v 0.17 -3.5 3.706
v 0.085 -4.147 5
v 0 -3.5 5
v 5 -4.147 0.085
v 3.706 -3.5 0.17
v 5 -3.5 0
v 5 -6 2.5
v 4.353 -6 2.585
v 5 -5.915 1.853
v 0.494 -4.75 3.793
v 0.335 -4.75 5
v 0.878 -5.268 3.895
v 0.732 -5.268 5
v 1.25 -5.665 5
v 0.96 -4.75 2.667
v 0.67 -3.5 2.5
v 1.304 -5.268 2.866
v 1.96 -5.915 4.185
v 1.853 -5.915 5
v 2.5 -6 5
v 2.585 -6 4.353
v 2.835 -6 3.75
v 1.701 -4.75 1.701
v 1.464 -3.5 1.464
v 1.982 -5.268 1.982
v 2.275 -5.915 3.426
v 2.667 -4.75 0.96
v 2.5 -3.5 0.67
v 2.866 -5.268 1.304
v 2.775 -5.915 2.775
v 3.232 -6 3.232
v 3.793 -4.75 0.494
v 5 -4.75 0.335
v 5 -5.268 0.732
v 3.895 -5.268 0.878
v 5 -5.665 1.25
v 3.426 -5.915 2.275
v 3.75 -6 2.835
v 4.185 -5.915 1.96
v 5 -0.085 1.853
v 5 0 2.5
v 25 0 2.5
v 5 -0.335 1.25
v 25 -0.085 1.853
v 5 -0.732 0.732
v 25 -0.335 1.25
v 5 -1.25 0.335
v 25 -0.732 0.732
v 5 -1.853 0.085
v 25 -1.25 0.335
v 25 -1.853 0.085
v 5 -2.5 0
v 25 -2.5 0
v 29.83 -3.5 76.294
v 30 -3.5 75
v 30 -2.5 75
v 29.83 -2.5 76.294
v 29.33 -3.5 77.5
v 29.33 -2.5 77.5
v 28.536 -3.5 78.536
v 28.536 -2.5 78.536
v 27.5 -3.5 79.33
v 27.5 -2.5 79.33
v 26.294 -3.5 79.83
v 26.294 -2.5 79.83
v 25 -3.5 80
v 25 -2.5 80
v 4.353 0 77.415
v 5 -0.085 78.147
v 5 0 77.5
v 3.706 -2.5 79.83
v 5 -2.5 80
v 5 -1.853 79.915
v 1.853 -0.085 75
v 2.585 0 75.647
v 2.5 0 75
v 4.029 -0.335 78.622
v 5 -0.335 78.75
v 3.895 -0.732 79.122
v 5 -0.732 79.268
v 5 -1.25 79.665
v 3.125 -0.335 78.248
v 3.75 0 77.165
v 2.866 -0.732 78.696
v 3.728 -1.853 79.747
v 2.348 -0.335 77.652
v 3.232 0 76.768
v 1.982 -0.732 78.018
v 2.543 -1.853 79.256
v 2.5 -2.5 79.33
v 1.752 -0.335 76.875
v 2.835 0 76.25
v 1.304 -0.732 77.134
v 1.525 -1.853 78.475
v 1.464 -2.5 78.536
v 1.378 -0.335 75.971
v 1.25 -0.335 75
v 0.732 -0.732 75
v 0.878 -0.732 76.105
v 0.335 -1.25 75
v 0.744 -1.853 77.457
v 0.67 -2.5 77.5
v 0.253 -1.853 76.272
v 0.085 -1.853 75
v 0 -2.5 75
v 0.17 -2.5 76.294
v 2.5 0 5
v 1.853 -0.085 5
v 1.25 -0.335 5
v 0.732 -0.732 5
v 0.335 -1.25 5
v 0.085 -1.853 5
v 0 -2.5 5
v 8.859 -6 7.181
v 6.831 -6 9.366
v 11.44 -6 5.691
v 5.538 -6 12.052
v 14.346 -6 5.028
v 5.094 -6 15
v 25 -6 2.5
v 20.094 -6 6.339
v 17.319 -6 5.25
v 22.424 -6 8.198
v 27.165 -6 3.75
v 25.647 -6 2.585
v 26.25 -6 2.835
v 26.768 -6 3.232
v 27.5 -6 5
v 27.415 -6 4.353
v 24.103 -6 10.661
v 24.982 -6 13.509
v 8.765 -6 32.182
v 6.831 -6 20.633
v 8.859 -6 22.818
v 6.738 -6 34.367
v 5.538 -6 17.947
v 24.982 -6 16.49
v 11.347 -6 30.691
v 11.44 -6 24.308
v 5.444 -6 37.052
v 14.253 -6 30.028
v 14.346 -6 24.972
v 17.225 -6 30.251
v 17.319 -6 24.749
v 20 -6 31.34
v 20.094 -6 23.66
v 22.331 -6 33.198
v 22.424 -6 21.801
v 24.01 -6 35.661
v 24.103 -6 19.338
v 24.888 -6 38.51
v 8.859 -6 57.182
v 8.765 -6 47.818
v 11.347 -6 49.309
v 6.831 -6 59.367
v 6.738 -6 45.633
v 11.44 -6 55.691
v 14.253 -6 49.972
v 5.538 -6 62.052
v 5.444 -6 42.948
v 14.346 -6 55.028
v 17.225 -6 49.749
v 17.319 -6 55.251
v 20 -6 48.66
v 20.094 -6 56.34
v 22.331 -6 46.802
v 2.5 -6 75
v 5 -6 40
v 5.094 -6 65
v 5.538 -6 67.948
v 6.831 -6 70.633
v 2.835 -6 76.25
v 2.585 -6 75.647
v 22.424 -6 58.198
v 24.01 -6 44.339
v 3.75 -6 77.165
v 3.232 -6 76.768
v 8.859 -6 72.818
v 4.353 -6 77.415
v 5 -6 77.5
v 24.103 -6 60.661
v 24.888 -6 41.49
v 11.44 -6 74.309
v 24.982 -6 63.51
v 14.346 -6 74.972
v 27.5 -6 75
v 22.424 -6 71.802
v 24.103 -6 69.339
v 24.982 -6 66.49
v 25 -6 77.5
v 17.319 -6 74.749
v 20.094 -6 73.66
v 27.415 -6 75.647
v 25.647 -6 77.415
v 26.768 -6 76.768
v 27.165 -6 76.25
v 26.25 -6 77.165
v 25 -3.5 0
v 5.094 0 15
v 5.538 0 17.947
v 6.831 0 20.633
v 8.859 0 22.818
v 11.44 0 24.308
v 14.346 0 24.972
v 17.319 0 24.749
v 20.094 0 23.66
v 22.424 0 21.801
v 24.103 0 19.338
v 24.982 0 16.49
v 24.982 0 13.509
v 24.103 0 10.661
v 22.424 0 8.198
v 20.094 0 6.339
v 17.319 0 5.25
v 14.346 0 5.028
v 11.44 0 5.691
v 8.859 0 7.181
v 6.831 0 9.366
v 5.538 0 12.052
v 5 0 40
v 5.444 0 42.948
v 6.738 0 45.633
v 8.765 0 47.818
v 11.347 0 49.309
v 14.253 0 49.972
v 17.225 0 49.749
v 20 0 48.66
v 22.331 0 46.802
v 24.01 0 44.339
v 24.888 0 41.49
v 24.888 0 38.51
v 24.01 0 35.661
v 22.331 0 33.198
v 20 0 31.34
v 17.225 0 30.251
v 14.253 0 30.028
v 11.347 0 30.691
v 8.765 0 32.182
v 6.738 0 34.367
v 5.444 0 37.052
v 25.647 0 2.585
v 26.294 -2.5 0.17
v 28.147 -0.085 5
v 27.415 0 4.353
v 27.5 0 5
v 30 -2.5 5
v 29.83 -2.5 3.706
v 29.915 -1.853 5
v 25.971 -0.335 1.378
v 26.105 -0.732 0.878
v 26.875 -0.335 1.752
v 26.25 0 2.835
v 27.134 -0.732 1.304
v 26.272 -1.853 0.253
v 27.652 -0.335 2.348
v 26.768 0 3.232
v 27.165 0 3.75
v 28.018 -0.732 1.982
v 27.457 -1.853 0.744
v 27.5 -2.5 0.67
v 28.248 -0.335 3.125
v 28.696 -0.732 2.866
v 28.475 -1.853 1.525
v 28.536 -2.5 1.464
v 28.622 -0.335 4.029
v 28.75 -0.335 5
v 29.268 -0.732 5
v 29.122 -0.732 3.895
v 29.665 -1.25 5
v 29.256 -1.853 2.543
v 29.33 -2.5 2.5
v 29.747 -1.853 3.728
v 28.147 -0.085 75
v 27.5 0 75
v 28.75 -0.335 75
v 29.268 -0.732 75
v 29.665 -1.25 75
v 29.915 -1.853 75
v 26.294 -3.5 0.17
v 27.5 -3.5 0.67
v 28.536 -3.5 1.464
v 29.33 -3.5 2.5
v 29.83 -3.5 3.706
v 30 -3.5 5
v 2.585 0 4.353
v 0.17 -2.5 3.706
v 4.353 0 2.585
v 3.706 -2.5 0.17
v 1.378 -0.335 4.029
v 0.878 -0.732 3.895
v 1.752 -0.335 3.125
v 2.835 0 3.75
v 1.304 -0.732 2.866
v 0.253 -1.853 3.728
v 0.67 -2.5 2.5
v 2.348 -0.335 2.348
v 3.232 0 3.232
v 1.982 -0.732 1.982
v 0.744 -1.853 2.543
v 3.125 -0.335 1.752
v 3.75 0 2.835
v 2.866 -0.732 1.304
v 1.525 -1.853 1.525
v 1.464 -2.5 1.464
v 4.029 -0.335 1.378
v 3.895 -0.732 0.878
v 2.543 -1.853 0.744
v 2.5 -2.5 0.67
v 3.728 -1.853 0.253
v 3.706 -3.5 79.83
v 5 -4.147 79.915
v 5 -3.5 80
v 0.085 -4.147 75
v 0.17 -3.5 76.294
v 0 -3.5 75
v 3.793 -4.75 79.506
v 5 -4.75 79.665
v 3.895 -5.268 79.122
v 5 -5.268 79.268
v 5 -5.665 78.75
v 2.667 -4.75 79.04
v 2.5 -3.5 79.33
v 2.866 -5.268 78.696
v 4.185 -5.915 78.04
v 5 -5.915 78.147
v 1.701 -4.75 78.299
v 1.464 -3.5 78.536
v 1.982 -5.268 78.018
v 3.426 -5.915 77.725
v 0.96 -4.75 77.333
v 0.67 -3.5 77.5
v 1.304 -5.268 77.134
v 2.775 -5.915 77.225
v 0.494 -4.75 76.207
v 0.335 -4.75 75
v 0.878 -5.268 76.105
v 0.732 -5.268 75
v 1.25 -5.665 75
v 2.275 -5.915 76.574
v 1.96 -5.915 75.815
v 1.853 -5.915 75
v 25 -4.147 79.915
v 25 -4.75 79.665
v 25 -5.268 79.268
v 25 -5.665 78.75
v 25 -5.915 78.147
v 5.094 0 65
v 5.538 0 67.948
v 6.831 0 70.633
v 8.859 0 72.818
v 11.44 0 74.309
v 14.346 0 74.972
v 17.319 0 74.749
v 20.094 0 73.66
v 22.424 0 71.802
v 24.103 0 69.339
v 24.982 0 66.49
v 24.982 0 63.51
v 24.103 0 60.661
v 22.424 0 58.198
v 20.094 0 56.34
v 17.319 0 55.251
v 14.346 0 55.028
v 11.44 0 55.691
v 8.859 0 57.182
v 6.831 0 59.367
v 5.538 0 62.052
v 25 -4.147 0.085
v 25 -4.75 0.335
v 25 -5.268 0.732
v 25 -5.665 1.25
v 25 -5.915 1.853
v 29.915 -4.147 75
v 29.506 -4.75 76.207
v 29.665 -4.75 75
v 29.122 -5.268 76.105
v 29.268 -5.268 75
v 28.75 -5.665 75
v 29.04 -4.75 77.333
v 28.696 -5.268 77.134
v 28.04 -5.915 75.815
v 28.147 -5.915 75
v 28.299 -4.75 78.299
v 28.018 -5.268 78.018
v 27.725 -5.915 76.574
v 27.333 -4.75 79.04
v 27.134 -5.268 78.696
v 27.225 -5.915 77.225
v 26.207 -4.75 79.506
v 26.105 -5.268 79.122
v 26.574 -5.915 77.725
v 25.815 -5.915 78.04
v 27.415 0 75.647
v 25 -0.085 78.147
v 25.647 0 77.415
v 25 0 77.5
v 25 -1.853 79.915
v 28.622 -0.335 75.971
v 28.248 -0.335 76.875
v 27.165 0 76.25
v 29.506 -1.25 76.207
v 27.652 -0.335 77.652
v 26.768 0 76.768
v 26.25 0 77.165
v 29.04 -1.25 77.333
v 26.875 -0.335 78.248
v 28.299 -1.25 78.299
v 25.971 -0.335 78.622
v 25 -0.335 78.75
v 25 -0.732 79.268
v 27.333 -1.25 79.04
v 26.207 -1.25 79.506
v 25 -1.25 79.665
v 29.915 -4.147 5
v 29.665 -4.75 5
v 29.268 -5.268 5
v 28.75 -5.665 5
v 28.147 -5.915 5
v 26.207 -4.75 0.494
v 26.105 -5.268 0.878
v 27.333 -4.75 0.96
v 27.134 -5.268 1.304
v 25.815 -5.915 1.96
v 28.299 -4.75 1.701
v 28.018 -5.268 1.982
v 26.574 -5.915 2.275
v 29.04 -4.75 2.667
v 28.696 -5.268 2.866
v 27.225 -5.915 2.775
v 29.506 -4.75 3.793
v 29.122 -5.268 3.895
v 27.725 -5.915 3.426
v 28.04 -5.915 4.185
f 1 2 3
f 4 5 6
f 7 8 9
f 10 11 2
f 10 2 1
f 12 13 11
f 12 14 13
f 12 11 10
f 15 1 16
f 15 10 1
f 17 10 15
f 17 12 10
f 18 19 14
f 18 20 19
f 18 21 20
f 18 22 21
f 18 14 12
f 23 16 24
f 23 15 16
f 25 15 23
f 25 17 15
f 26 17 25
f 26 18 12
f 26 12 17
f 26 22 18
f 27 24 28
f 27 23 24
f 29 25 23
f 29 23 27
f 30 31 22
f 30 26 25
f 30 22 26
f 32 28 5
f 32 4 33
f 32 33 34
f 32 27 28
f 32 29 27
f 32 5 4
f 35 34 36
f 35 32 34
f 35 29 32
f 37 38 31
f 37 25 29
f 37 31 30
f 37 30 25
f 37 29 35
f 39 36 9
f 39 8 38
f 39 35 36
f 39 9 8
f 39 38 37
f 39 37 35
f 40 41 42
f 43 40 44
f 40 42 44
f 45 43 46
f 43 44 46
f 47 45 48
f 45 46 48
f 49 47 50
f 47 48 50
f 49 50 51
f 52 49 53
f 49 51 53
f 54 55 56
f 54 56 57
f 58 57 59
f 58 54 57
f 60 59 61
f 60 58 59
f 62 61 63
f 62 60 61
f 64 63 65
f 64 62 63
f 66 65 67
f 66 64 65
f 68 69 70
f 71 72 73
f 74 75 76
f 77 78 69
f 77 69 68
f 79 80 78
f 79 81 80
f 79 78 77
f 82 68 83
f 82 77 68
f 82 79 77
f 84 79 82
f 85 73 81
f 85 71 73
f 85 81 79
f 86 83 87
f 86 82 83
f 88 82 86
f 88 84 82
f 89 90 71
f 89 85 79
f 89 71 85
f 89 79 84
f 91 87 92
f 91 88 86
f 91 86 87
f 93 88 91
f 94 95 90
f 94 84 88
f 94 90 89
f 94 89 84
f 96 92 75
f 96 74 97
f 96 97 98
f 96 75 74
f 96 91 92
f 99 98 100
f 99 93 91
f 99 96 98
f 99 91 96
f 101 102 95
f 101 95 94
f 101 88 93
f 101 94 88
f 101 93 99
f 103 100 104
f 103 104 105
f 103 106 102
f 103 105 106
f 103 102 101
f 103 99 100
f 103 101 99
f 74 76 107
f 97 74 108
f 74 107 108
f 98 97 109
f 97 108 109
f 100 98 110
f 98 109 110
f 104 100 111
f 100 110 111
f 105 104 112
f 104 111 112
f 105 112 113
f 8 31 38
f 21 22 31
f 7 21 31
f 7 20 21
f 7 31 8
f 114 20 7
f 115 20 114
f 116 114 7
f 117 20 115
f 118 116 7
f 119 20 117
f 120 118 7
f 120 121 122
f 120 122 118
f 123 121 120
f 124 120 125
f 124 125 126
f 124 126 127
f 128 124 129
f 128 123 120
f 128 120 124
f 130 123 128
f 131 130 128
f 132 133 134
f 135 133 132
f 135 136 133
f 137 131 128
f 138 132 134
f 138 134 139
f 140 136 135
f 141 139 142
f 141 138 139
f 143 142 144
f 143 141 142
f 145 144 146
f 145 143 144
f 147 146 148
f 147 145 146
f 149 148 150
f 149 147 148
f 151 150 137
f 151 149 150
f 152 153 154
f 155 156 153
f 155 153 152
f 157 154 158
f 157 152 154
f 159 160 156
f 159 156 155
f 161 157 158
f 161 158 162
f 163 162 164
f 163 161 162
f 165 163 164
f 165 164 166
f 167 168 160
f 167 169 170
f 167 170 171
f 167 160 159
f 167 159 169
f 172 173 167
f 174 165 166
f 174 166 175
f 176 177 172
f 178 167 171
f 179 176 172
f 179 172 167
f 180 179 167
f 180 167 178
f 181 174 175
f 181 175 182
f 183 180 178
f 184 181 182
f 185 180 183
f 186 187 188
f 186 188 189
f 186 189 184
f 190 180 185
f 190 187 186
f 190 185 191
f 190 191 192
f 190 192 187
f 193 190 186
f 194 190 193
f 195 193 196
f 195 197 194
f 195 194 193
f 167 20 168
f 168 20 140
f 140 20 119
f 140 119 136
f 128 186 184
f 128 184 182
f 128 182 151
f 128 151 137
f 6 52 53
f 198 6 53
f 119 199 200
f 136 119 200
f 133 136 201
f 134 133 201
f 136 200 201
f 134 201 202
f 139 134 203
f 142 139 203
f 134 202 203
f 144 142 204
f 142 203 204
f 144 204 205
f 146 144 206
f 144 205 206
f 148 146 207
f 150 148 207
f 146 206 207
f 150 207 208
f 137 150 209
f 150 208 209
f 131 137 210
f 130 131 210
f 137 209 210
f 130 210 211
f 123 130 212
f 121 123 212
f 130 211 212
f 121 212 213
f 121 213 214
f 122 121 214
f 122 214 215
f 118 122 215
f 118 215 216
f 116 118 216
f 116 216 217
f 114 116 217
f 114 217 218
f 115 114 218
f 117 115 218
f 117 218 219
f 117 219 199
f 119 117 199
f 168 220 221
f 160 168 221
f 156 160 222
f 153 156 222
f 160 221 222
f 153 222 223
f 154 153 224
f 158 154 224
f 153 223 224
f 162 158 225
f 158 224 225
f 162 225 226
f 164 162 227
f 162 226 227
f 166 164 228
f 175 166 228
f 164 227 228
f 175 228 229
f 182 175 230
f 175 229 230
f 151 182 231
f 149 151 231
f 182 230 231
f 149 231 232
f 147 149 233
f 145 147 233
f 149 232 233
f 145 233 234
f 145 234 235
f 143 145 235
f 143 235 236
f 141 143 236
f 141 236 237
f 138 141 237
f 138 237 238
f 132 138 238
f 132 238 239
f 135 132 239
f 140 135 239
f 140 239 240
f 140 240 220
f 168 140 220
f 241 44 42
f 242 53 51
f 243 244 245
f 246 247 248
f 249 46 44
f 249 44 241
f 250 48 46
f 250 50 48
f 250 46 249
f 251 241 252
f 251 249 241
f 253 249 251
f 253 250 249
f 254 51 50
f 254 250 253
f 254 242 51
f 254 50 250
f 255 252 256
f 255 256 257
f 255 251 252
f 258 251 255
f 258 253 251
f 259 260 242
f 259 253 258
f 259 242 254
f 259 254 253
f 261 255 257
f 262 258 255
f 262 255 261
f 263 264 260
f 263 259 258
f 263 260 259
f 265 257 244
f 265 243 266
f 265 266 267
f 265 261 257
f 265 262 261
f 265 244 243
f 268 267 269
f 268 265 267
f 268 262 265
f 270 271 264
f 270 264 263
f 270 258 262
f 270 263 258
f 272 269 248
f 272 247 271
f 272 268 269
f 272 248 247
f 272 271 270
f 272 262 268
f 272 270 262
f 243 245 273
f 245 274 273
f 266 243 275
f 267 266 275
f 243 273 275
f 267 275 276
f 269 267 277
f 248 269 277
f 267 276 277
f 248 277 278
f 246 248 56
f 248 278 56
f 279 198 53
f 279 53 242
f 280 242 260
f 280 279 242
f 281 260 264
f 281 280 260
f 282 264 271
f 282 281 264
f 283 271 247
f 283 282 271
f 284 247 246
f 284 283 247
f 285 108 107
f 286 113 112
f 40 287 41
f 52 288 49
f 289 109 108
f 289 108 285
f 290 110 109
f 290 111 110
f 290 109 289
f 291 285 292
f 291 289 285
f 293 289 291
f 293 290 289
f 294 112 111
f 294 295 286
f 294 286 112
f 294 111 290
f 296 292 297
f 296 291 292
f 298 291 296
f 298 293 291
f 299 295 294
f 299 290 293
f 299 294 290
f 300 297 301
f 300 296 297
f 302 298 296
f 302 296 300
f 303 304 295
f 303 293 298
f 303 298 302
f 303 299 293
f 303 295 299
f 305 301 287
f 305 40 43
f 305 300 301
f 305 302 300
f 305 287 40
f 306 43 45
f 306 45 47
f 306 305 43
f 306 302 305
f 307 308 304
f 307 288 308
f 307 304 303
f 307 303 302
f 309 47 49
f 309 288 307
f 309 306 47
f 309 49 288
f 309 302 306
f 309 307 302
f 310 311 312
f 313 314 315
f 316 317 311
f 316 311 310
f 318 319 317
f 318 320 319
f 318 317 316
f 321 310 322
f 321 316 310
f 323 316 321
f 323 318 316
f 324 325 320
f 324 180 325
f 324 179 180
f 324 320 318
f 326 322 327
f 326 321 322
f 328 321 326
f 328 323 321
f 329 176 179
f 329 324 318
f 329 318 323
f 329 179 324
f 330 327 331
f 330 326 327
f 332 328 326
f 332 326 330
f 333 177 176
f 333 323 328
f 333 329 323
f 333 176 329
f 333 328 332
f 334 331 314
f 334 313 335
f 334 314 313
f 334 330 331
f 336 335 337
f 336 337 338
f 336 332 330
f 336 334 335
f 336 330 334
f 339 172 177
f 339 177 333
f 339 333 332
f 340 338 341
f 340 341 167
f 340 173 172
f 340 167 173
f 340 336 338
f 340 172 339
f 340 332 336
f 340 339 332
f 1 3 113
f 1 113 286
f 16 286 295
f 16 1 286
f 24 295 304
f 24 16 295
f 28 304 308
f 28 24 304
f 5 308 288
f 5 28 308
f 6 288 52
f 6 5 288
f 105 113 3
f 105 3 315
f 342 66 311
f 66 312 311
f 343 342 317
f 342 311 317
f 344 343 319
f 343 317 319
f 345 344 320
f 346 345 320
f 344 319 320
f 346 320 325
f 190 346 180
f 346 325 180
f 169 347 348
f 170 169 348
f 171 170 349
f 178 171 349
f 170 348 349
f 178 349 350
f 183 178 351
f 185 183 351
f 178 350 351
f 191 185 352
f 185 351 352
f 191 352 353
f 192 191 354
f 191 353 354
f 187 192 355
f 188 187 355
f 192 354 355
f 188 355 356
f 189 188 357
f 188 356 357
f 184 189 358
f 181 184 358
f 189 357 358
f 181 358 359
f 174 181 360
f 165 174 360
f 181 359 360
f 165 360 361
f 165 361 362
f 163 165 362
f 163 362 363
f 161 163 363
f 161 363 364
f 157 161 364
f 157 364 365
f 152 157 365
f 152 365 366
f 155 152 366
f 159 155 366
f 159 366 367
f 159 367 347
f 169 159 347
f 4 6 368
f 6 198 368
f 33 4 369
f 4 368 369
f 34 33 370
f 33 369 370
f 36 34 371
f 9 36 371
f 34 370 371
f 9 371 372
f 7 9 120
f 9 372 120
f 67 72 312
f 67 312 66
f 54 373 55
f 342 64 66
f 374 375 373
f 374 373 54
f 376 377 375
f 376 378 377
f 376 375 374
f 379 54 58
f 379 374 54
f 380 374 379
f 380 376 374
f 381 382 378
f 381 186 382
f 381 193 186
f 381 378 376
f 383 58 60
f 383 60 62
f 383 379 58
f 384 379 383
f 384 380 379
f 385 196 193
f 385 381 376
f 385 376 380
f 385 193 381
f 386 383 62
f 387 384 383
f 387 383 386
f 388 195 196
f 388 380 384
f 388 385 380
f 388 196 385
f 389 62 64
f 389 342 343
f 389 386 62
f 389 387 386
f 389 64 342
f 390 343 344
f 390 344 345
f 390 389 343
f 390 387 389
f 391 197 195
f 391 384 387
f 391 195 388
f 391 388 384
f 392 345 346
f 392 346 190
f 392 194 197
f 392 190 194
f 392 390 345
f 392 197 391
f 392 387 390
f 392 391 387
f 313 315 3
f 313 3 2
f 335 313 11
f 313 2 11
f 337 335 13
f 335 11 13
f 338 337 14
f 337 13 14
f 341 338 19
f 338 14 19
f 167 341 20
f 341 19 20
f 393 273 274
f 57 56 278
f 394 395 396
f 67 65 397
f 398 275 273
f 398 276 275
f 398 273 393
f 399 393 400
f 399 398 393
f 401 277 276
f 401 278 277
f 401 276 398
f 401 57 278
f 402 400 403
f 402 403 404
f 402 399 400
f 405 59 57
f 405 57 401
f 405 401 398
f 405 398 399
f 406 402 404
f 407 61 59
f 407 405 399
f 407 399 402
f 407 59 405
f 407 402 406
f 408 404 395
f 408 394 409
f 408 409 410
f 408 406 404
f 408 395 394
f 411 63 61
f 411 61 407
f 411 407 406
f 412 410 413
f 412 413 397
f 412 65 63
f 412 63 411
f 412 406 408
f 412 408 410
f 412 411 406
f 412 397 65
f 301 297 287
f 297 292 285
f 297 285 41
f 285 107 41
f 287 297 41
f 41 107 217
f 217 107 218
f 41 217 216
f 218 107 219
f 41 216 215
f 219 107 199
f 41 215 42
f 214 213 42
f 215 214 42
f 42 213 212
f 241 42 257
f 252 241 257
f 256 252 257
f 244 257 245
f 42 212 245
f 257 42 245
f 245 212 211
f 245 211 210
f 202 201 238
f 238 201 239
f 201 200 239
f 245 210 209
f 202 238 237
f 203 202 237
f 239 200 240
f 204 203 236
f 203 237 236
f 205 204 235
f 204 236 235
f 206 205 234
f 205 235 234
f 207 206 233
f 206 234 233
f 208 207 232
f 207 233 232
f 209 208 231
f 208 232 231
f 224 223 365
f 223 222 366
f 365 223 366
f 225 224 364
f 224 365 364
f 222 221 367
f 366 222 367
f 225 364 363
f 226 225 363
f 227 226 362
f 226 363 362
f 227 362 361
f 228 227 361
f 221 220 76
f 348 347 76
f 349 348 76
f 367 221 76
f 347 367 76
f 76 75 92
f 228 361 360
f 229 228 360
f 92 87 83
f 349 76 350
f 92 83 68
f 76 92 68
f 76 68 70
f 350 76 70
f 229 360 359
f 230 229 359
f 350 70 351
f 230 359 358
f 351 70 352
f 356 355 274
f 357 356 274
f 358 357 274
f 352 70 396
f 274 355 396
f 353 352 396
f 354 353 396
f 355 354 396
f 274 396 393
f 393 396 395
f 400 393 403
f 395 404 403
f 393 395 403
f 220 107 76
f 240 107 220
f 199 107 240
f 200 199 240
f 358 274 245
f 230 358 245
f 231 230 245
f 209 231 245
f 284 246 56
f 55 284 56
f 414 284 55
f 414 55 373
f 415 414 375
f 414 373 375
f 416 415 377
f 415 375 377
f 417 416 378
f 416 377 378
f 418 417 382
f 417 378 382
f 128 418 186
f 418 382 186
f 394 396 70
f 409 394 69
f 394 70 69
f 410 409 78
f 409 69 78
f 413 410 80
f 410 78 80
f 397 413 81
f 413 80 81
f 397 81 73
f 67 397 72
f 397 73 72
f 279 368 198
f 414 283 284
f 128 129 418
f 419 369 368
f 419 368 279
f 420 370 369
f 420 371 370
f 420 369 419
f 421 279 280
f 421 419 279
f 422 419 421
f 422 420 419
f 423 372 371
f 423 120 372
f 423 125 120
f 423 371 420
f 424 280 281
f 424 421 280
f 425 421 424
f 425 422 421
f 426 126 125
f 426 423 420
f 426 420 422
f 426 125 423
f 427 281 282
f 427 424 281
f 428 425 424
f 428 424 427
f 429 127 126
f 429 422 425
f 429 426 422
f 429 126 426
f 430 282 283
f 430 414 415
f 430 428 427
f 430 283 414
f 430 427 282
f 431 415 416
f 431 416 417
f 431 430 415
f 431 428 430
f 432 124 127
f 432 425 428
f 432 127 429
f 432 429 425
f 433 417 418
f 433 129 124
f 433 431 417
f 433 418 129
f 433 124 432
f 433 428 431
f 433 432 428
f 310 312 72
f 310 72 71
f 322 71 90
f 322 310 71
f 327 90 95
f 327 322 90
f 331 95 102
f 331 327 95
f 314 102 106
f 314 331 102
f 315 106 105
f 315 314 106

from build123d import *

# Parameters (mm, degrees)
F0_W     = 30
F0_H     = 80
F1_DEPTH = 6
F2_R     = 5
F3_R     = 5
F4_R     = 5
F5_R     = 5
F6_R     = 2.5
F7_R     = 2.5
F9_D     = 20
F13_D    = 20
F14_D    = 20


with BuildPart() as f1:
    # F0 (on Front) → F1 (new body)
    with BuildSketch(Plane.XZ):
        with Locations((15, 40)):
            Rectangle(F0_W, F0_H)
    extrude(amount=F1_DEPTH)

    # F2
    f2_edges = [f1.edges().sort_by_distance(p)[0] for p in [
        (30, -3, 80),
    ]]
    fillet(f2_edges, radius=F2_R)

    # F3
    f3_edges = [f1.edges().sort_by_distance(p)[0] for p in [
        (0, -3, 80),
    ]]
    fillet(f3_edges, radius=F3_R)

    # F4
    f4_edges = [f1.edges().sort_by_distance(p)[0] for p in [
        (0, -3, 0),
    ]]
    fillet(f4_edges, radius=F4_R)

    # F5
    f5_edges = [f1.edges().sort_by_distance(p)[0] for p in [
        (30, -3, 0),
    ]]
    fillet(f5_edges, radius=F5_R)

    # F6
    f6_edges = [f1.edges().sort_by_distance(p)[0] for p in [
        (28.535534, -6, 78.535534),
    ]]
    fillet(f6_edges, radius=F6_R)

    # F7
    f7_edges = [f1.edges().sort_by_distance(p)[0] for p in [
        (28.535534, 0, 78.535534),
    ]]
    fillet(f7_edges, radius=F7_R)

    # F9 (through all)
    with Locations(Plane.XZ.offset(6)):
        with Locations((15, 40)):
            Hole(F9_D / 2)

    # F13 (through all)
    with Locations(Plane.XZ.offset(6)):
        with Locations((15.093754977, 65)):
            Hole(F13_D / 2)

    # F14 (through all)
    with Locations(Plane.XZ.offset(6)):
        with Locations((15.093754977, 14.9996483952)):
            Hole(F14_D / 2)


solid = f1.part
